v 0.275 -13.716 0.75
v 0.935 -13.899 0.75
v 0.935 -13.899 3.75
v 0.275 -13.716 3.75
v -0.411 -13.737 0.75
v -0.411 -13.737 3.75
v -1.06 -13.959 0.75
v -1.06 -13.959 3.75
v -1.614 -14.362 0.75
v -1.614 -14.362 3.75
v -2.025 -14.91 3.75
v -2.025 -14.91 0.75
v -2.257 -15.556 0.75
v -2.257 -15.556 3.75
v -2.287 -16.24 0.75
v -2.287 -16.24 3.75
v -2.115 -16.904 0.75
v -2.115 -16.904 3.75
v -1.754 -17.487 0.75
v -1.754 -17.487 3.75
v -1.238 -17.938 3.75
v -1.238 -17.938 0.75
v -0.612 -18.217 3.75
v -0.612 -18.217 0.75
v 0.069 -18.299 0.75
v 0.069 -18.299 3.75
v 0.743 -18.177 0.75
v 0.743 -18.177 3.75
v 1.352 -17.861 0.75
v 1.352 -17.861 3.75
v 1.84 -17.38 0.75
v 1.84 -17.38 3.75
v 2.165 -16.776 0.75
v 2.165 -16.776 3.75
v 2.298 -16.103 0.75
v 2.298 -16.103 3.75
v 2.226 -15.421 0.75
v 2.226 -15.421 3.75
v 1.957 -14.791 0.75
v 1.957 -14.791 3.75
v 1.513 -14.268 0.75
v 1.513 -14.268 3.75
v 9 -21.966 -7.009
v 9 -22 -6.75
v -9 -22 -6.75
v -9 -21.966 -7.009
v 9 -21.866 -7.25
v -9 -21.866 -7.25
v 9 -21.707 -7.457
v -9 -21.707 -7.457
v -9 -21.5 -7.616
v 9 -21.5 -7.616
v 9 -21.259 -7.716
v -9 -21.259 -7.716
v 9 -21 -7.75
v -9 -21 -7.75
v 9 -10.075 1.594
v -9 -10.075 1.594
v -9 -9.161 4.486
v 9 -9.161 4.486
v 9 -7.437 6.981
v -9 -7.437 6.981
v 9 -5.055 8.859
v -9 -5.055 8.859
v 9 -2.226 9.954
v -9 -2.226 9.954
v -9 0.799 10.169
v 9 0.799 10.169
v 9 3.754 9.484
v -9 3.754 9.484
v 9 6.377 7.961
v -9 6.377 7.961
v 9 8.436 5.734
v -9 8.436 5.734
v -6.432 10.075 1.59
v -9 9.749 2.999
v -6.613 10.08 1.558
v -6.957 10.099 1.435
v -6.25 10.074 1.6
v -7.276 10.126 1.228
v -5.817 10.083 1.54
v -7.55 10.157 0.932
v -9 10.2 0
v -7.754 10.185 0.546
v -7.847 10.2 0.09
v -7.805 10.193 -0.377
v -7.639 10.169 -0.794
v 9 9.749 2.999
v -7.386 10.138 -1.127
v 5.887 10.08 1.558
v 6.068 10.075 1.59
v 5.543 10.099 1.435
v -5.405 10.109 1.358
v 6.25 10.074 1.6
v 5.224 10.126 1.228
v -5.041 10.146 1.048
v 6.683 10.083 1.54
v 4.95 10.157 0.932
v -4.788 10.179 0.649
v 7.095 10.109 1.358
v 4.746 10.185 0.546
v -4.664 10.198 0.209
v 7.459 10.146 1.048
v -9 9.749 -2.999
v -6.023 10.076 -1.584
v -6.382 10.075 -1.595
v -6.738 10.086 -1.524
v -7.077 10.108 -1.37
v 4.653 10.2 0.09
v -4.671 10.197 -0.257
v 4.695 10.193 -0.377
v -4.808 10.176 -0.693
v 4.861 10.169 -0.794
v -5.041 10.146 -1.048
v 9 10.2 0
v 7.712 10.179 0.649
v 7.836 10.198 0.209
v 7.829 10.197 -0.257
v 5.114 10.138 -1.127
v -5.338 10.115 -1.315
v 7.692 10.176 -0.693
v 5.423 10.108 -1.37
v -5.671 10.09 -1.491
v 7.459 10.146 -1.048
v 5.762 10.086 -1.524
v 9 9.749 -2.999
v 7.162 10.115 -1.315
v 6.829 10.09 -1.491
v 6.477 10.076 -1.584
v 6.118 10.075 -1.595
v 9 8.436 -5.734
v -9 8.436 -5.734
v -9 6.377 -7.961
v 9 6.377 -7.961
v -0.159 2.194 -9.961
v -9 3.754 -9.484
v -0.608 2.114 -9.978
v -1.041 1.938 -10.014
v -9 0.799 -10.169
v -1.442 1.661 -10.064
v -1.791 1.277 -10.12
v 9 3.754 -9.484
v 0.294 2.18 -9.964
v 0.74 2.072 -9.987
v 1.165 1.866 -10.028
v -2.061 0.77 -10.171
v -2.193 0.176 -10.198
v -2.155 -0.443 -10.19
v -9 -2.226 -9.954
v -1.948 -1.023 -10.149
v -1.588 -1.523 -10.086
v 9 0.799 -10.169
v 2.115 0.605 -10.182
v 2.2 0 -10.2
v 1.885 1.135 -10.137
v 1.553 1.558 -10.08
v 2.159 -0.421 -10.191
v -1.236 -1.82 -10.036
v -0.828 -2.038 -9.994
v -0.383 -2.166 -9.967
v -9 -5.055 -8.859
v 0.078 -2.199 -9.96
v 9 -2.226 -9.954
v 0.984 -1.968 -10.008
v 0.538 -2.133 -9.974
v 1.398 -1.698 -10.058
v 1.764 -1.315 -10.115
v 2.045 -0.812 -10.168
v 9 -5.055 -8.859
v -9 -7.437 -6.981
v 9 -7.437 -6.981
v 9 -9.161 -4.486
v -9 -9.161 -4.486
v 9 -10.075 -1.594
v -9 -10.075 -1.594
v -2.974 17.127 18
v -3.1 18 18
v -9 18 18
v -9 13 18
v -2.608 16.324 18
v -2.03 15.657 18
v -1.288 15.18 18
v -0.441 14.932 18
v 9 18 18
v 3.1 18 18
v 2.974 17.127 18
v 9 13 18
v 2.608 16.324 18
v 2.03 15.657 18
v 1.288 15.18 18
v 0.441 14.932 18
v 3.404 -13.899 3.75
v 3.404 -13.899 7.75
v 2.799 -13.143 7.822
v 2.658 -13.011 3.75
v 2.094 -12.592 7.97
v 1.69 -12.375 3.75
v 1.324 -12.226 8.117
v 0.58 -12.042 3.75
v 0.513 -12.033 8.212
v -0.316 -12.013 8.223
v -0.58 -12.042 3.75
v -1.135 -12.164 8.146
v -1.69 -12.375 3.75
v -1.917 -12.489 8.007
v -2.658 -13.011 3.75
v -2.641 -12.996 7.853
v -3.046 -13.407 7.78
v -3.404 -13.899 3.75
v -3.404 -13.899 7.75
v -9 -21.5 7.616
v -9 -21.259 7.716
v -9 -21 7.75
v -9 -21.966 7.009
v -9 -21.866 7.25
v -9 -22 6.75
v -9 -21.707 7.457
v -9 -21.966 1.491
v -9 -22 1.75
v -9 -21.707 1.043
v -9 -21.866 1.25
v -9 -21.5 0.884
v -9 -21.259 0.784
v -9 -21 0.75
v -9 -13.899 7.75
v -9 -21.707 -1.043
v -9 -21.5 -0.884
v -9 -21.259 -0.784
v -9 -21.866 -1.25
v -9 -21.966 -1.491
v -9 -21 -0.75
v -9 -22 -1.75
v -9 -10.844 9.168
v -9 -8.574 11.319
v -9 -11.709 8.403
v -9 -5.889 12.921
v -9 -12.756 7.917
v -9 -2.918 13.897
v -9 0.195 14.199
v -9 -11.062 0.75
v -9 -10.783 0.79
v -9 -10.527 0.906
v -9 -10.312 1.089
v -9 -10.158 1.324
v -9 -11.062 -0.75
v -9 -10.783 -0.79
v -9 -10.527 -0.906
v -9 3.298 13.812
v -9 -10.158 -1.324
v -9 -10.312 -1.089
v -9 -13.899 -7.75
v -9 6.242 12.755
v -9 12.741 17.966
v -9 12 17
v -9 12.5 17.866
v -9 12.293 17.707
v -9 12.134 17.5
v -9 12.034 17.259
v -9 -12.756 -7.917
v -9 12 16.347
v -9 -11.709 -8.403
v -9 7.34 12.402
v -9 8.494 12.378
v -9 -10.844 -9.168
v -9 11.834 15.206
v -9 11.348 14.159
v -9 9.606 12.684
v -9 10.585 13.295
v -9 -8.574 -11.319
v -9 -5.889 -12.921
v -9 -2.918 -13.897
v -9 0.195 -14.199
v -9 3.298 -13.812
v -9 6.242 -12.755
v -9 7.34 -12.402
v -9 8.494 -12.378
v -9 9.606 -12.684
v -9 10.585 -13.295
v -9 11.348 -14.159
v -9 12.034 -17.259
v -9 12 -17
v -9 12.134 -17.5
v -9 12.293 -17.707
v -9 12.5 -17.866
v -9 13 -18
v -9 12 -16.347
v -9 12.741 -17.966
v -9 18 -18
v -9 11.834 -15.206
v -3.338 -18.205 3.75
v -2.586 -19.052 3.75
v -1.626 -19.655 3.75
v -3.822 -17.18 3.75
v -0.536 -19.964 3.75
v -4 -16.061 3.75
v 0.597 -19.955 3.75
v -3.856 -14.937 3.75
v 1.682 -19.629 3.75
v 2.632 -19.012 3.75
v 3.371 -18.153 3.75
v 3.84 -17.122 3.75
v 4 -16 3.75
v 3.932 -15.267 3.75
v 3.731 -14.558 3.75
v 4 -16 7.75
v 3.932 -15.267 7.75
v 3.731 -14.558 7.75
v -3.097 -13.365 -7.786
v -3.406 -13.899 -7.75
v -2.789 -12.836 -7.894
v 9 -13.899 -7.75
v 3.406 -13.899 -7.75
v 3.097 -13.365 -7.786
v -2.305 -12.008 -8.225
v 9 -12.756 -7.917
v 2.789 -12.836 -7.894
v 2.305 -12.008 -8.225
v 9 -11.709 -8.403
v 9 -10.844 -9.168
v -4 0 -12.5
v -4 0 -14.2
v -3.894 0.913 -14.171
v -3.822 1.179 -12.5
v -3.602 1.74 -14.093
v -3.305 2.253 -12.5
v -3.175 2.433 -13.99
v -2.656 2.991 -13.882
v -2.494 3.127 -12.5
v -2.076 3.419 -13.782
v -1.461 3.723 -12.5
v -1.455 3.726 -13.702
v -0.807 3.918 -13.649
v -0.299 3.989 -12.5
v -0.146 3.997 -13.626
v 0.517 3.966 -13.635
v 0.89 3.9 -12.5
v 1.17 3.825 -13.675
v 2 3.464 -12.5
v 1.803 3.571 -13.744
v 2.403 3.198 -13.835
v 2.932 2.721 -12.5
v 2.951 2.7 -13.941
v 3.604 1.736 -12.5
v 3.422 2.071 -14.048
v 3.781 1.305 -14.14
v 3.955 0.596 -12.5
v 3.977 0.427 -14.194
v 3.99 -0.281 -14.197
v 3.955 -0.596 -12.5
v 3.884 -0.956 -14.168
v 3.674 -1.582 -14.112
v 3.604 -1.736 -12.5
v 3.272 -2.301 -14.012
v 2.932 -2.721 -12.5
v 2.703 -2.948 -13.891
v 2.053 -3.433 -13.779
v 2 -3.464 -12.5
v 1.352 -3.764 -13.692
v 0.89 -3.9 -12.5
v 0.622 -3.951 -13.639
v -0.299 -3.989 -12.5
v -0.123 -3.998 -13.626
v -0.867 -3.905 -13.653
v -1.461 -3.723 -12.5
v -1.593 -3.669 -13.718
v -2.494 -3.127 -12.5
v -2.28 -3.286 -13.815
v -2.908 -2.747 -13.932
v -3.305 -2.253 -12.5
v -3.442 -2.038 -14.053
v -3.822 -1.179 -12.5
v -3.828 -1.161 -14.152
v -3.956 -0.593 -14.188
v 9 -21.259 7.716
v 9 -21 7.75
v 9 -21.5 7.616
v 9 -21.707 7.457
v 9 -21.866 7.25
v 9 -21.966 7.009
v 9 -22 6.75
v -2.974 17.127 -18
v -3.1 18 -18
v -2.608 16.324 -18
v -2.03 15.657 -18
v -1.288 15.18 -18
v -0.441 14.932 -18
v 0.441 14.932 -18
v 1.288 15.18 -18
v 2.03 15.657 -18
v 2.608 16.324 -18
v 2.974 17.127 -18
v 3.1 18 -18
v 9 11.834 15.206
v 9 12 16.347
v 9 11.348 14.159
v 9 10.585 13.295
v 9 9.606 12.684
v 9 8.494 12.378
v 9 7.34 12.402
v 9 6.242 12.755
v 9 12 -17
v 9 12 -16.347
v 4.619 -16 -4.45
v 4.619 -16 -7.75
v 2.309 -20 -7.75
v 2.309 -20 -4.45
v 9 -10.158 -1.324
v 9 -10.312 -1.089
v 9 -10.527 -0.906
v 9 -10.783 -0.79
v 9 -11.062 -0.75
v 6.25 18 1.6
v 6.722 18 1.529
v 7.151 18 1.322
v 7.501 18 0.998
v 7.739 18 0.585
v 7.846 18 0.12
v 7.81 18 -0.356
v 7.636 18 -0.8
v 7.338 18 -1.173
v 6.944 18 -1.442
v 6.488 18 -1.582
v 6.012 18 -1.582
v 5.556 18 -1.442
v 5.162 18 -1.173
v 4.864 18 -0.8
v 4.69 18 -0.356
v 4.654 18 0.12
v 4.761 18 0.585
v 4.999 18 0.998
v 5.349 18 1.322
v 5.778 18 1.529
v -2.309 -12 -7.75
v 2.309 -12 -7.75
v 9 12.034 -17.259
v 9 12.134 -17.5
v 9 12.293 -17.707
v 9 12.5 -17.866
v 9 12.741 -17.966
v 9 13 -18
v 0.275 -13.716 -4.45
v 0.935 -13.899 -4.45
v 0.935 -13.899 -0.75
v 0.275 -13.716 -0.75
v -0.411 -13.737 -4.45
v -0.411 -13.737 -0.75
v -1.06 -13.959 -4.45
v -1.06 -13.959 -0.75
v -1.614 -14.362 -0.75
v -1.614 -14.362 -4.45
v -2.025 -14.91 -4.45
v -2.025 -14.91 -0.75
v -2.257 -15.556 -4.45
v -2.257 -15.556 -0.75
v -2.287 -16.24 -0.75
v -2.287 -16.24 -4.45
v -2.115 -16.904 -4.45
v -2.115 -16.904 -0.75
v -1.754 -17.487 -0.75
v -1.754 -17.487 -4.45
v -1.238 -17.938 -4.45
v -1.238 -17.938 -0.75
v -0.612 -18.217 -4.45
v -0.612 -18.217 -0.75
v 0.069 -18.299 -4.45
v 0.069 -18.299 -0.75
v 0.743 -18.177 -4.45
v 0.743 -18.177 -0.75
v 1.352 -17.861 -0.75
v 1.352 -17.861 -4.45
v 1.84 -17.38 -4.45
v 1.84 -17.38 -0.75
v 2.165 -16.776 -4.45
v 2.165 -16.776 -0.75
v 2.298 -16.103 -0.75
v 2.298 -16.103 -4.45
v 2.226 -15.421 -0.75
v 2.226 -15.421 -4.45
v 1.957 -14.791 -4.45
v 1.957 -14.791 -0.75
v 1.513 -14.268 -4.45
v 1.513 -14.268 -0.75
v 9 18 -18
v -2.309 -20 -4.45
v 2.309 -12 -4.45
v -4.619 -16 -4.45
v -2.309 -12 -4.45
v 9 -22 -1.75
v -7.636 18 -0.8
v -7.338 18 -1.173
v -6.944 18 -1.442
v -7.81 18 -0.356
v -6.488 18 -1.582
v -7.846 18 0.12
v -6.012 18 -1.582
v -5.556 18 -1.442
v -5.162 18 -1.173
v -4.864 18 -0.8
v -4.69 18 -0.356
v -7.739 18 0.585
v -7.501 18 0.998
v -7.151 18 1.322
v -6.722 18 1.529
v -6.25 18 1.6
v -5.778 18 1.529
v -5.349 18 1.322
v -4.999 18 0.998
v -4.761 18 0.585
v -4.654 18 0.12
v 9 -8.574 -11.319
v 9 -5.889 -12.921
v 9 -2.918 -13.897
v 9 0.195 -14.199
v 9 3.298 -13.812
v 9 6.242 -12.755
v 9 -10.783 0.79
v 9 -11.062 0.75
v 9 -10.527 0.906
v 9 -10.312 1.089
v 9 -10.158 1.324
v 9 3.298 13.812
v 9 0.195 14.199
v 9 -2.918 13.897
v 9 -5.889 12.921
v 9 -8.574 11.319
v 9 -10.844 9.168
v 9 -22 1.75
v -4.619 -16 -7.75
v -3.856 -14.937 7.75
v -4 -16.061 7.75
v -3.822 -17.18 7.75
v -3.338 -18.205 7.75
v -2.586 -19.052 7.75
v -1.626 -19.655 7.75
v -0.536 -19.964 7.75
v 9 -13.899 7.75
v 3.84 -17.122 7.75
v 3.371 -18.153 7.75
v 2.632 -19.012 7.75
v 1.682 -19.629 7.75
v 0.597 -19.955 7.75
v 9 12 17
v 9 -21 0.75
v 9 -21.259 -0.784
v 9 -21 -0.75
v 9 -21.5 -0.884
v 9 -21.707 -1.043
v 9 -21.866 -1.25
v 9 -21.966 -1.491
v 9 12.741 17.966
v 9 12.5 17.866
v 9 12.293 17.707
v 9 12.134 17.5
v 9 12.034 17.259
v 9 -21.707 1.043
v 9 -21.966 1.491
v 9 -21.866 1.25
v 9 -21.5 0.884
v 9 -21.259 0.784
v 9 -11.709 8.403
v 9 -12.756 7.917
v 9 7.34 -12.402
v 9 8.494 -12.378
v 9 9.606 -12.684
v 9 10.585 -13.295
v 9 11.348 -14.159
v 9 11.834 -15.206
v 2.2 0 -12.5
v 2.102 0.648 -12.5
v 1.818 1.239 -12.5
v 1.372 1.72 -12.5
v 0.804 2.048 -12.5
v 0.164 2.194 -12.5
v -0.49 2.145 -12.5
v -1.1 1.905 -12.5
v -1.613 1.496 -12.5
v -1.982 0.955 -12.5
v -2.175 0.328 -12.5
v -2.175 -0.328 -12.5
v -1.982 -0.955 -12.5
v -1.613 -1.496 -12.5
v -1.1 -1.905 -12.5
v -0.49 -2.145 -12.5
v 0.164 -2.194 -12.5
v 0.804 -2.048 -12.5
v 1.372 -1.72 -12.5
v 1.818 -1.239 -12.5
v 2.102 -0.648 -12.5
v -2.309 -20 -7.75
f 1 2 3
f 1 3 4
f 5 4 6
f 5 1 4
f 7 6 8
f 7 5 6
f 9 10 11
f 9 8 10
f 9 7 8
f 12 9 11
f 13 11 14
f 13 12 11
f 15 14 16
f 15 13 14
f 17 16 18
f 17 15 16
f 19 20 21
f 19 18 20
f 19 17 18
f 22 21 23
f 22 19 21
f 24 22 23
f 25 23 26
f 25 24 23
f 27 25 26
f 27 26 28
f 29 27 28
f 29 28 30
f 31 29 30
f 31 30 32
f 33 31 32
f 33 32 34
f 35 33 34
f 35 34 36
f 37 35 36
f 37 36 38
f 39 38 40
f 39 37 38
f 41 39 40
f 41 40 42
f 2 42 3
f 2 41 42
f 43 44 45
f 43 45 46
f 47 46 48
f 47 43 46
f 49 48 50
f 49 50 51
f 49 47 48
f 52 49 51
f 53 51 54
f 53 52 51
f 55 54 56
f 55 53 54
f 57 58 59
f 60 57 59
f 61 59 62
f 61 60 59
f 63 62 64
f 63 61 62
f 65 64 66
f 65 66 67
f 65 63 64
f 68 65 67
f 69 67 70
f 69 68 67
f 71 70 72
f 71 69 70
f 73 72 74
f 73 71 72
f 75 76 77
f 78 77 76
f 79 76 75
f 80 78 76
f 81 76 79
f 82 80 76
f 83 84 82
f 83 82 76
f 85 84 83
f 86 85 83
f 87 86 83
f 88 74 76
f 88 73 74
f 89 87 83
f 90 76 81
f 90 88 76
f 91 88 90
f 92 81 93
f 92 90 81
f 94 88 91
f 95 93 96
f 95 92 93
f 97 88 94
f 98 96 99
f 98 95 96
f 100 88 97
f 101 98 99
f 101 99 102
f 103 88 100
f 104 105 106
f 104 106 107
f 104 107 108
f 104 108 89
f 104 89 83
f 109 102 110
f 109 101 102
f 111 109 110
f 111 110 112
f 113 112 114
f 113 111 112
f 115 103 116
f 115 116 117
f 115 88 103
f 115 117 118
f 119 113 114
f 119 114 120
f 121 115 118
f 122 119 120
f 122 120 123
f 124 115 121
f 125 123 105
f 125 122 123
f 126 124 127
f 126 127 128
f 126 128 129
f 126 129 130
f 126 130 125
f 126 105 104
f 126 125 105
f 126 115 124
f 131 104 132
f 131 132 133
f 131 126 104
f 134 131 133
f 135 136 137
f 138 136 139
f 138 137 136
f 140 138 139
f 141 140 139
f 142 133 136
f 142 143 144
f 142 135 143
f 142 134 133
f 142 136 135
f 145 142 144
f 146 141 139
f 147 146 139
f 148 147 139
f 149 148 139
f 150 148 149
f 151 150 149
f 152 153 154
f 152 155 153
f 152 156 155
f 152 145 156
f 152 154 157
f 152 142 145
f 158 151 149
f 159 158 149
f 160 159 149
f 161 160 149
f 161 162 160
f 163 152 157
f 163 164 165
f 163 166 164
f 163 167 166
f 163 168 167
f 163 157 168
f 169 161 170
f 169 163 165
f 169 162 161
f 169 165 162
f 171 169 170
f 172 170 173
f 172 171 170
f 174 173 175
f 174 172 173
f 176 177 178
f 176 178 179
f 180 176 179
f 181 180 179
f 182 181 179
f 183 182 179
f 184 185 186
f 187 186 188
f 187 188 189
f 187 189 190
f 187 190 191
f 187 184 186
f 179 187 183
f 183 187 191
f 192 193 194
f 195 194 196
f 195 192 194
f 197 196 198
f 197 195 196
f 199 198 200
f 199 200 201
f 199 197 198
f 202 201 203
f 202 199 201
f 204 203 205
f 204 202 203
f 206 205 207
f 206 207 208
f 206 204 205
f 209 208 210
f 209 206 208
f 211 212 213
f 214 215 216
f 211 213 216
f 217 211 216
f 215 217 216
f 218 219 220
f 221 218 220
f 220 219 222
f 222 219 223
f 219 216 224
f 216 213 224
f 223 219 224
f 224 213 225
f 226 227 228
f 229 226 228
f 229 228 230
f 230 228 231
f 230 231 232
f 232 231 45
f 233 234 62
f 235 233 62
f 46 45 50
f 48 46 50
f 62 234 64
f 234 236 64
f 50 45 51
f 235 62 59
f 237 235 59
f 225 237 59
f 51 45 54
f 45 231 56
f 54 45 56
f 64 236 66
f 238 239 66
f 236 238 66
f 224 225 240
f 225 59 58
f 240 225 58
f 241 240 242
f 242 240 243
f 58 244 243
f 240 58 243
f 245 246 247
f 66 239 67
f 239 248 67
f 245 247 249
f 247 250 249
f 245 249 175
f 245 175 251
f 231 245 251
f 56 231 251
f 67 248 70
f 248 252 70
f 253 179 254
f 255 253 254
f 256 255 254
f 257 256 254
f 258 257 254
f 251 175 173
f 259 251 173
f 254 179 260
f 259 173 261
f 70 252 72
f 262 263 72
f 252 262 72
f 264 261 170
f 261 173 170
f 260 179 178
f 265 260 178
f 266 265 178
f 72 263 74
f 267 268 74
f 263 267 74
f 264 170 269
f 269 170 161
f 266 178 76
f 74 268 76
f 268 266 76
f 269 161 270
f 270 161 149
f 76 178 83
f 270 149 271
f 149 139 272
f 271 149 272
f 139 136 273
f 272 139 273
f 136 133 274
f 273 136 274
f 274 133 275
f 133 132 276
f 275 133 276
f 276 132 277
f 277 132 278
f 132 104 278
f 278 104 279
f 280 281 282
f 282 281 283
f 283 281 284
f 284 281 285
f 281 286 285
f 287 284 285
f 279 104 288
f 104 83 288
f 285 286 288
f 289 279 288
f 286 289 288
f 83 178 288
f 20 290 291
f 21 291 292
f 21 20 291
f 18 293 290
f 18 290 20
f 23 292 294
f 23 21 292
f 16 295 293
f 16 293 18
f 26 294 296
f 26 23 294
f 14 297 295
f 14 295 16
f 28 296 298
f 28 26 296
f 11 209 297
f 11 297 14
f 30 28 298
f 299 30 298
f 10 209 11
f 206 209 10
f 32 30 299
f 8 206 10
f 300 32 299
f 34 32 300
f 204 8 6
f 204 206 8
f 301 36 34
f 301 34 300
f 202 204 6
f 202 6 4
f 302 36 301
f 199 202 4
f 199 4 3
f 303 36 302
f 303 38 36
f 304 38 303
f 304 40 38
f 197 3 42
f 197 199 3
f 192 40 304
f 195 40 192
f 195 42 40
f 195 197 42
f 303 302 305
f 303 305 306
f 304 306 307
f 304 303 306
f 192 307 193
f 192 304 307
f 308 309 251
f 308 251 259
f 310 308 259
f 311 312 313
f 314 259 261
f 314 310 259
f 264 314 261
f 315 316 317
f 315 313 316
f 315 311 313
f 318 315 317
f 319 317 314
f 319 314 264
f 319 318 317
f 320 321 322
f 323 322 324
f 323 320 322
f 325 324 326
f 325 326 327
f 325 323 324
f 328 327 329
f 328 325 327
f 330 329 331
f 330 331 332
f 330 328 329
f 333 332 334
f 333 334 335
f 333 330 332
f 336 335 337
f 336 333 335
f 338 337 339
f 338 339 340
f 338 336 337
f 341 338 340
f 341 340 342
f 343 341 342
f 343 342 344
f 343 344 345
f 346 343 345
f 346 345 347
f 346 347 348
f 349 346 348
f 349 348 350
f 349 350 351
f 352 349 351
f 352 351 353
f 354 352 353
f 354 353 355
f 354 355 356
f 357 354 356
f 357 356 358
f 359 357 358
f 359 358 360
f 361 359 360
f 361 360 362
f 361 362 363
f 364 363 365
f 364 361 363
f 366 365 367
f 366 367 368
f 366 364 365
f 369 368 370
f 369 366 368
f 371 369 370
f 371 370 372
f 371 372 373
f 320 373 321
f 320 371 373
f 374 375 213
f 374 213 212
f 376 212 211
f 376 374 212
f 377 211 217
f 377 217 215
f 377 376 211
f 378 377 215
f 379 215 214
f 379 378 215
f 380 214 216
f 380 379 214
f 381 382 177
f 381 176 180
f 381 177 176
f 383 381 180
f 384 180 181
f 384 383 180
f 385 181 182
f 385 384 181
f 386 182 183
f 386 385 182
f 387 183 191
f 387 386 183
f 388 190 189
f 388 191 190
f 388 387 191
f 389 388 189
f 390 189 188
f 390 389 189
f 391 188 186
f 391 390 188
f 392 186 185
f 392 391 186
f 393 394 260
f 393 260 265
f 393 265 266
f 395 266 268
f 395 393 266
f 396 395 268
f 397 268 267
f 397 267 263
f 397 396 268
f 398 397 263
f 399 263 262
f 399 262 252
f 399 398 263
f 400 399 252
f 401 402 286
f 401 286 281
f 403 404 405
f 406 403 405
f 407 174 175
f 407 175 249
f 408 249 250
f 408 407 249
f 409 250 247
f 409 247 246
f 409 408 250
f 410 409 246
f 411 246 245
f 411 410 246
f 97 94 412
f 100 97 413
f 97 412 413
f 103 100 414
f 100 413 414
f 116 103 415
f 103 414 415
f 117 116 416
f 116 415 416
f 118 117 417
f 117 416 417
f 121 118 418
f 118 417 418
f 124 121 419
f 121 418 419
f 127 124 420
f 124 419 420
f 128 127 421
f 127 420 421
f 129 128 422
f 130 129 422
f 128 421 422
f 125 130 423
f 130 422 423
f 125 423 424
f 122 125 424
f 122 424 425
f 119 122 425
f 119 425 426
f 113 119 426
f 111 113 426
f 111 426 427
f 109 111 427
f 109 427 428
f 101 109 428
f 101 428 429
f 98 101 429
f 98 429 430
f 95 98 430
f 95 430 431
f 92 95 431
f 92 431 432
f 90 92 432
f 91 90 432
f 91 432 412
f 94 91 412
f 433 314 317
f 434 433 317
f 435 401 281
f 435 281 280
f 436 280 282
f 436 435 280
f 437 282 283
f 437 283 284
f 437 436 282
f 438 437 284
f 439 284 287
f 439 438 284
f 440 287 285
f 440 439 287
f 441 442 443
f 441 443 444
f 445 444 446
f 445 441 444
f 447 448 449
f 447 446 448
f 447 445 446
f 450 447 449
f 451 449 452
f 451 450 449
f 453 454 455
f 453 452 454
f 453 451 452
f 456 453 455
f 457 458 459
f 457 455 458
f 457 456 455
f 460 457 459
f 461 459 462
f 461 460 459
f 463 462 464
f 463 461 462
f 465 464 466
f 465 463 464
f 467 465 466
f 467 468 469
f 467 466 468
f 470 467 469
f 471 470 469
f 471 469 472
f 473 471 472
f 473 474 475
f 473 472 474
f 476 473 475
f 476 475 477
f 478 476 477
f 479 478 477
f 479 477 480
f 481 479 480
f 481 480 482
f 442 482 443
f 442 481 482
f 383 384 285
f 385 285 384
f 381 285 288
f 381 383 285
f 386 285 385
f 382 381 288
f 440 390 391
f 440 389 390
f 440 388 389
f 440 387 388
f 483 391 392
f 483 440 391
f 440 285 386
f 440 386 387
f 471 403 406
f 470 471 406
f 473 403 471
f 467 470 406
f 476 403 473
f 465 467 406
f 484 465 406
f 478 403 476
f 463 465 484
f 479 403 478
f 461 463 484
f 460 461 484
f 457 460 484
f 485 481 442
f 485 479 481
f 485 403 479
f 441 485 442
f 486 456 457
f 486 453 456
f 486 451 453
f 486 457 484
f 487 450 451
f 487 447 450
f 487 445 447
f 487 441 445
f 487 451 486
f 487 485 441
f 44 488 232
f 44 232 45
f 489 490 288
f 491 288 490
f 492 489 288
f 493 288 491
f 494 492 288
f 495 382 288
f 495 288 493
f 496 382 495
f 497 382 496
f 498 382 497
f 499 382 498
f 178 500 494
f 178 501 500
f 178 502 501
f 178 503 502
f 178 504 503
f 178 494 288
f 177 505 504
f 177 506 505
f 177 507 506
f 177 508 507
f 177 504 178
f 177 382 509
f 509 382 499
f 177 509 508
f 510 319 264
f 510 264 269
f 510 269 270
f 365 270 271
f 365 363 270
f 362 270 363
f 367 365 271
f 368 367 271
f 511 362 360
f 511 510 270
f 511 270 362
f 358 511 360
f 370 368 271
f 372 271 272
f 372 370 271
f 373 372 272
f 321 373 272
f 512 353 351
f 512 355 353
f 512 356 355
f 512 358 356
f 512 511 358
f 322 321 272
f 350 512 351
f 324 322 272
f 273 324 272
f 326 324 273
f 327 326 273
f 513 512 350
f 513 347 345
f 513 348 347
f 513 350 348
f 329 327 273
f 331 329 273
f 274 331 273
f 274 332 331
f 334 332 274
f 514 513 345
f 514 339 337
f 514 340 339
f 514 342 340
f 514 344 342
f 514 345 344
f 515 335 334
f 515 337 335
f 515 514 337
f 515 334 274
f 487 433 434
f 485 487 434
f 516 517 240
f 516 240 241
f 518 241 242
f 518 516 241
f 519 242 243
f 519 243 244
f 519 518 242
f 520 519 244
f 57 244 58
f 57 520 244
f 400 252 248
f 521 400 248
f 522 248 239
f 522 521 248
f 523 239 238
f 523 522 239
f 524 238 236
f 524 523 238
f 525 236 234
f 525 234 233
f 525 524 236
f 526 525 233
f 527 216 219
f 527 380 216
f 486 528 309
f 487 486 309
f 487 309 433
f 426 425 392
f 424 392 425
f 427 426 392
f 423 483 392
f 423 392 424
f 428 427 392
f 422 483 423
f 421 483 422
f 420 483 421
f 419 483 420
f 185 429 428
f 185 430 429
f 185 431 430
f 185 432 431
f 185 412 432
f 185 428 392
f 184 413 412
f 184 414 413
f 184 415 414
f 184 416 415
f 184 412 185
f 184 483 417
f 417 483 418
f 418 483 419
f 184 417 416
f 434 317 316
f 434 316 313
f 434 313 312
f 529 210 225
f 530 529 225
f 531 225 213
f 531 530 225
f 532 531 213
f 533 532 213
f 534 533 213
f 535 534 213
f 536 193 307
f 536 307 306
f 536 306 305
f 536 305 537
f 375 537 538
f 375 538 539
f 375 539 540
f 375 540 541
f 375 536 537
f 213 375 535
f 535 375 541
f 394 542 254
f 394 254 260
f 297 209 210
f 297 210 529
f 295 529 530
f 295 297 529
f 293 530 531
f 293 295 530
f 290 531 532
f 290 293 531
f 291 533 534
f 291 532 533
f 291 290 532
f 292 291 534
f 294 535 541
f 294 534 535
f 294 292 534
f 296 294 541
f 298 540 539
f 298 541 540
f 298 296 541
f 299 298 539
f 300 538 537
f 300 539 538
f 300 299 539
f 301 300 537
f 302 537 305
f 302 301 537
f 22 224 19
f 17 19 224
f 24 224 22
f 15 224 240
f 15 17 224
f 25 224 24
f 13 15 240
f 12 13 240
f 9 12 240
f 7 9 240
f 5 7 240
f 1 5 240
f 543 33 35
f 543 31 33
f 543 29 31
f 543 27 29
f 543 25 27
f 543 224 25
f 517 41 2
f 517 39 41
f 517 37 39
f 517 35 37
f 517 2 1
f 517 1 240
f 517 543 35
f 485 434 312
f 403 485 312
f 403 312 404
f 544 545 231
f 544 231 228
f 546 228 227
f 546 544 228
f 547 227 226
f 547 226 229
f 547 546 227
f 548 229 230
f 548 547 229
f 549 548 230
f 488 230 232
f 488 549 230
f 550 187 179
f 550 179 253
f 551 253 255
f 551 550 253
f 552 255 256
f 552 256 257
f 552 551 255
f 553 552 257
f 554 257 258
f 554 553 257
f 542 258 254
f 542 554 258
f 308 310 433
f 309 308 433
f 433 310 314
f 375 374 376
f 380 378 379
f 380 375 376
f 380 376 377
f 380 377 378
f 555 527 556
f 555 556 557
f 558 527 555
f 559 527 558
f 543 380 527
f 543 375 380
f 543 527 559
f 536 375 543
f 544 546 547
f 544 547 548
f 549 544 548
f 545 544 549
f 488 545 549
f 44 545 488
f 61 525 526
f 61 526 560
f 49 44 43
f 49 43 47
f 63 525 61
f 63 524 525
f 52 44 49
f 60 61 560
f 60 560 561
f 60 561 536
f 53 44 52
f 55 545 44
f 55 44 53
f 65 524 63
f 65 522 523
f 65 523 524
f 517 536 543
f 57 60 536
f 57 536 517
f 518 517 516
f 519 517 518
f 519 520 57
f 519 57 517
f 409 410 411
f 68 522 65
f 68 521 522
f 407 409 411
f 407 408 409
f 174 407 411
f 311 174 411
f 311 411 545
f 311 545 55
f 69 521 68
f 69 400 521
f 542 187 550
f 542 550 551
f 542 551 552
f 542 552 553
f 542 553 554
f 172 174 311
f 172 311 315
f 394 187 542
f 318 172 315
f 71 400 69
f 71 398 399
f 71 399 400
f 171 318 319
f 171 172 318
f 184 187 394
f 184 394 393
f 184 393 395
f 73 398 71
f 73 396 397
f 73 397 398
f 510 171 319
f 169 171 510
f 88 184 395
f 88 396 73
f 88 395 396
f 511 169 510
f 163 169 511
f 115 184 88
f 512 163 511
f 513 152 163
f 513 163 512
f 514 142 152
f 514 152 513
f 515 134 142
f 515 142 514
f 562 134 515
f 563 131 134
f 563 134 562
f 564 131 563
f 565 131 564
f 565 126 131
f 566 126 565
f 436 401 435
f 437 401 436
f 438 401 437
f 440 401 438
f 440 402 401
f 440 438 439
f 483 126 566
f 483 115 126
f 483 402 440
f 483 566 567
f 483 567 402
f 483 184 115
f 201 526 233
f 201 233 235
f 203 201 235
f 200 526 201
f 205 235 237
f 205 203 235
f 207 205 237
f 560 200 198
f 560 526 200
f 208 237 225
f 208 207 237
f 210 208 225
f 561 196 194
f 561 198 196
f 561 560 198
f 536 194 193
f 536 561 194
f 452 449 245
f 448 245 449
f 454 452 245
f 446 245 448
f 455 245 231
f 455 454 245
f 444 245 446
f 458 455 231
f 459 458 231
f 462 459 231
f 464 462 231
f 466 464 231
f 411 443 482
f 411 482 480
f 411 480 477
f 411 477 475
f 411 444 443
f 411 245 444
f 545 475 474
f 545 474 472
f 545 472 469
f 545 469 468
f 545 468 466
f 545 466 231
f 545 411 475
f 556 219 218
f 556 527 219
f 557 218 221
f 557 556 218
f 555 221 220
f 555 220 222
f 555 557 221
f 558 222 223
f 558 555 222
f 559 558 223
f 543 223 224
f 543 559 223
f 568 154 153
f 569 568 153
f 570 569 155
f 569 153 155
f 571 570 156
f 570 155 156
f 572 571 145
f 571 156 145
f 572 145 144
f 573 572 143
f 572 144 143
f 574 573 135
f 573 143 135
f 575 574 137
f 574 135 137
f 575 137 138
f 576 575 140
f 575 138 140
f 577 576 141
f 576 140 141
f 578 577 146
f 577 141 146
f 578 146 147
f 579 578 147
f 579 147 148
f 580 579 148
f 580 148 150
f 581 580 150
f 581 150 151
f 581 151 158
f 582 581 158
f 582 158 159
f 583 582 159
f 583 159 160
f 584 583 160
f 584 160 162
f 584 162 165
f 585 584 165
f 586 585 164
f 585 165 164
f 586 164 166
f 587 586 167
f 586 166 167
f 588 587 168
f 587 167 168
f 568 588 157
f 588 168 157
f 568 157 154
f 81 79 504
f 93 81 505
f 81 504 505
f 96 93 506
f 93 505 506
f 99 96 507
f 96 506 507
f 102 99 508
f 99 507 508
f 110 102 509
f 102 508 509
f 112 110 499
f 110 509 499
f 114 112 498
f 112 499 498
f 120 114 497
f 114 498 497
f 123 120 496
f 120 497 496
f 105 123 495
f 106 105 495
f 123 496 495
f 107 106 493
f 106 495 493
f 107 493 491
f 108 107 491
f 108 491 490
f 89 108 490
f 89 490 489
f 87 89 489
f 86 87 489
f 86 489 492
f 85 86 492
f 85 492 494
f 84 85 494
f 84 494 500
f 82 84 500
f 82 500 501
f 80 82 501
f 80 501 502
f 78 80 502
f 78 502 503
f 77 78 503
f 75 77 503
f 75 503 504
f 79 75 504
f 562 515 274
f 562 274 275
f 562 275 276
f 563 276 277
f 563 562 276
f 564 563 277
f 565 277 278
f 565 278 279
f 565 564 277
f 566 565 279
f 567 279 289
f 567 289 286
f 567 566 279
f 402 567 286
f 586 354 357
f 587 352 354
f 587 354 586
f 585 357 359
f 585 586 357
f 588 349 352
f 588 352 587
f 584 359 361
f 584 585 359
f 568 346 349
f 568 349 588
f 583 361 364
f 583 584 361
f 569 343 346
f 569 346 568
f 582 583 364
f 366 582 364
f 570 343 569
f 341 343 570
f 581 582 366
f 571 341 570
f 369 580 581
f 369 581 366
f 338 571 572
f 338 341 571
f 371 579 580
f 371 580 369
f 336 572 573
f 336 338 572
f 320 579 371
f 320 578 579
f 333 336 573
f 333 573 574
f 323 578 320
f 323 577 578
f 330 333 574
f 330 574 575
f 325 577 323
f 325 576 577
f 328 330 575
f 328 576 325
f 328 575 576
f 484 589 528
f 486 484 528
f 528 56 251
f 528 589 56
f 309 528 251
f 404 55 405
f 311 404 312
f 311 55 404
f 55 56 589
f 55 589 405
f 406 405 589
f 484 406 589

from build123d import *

# Parameters (mm, degrees)
EXTRUDE_1_DEPTH               = 9
CUT_EXTRUDE_1_DEPTH           = 30.816103032
CUT_EXTRUDE_1_DEPTH_BACK      = 30.816103032
SKETCH_2_R                    = 2.3
CUT_EXTRUDE_2_DEPTH           = 3.3
CUT_EXTRUDE_2_OTHER_WAY_DEPTH = 36.043722716
CUT_EXTRUDE_2_OTHER_WAY_TAPER = 1
CUT_EXTRUDE_3_DEPTH           = 36.043722716
CUT_EXTRUDE_3_DEPTH_BACK      = 4
CUT_EXTRUDE_4_REACH           = 46.777
CUT_EXTRUDE_4_END_RADIUS      = 10.2
SKETCH_5_R                    = 1.6
SKETCH_6_R                    = 2.2
CUT_EXTRUDE_5_DEPTH           = 30.816103062
CUT_EXTRUDE_START             = -5.5
SKETCH_7_R                    = 4
SKETCH_7_R_2                  = 2.2
CUT_EXTRUDE_6_DEPTH           = 5.5


with BuildPart() as part:
    # Эскиз1 → Бобышка-Вытянуть1 (new, symmetric)
    with BuildSketch(Plane(origin=(0, 0, 0), x_dir=(0, 0, -1), z_dir=(1, 0, 0))):
        with BuildLine():
            Line((-0.75, -21), (-0.75, -11.06243644))
            ThreePointArc((-0.75, -11.06243644), (-0.989654684, -10.412917388), (-1.59375, -10.074718901))
            ThreePointArc((-1.59375, -10.074718901), (0, 10.2), (1.59375, -10.074718901))
            ThreePointArc((1.59375, -10.074718901), (0.989654684, -10.412917388), (0.75, -11.06243644))
            Line((0.75, -11.06243644), (0.75, -21))
            ThreePointArc((0.75, -21), (1.042893219, -21.707106781), (1.75, -22))
            Line((1.75, -22), (6.75, -22))
            ThreePointArc((6.75, -22), (7.457106781, -21.707106781), (7.75, -21))
            Line((7.75, -21), (7.75, -13.898830886))
            ThreePointArc((7.75, -13.898830886), (8.121662204, -12.215036114), (9.167582418, -10.844142779))
            ThreePointArc((9.167582418, -10.844142779), (13.897042702, -2.917568189), (12.75462481, 6.241758242))
            ThreePointArc((12.75462481, 6.241758242), (12.953882386, 10.117431577), (16.34747687, 12))
            Line((16.34747687, 12), (17, 12))
            ThreePointArc((17, 12), (17.707106781, 12.292893219), (18, 13))
            Line((18, 13), (18, 18))
            Line((18, 18), (-18, 18))
            Line((-18, 18), (-18, 13))
            ThreePointArc((-18, 13), (-17.707106781, 12.292893219), (-17, 12))
            Line((-17, 12), (-16.34747687, 12))
            ThreePointArc((-16.34747687, 12), (-12.953882386, 10.117431577), (-12.75462481, 6.241758242))
            ThreePointArc((-12.75462481, 6.241758242), (-13.897042702, -2.917568189), (-9.167582418, -10.844142779))
            ThreePointArc((-9.167582418, -10.844142779), (-8.121662204, -12.215036114), (-7.75, -13.898830886))
            Line((-7.75, -13.898830886), (-7.75, -21))
            ThreePointArc((-7.75, -21), (-7.457106781, -21.707106781), (-6.75, -22))
            Line((-6.75, -22), (-1.75, -22))
            ThreePointArc((-1.75, -22), (-1.042893219, -21.707106781), (-0.75, -21))
        make_face()
    extrude(amount=EXTRUDE_1_DEPTH, both=True)

    # Эскиз2 → Вырез-Вытянуть1 (cut, two sides: drawn at the far end of the back side and taken through both)
    with BuildSketch(Plane.XY.offset(-CUT_EXTRUDE_1_DEPTH_BACK)):
        with BuildLine():
            ThreePointArc((-3.1, 18), (0, 14.9), (3.1, 18))
            Line((3.1, 18), (-3.1, 18))
        make_face()
        with Locations(Location((0, -16, 0), (0, 0, 66.000891847))):
            Circle(SKETCH_2_R)
    extrude(amount=CUT_EXTRUDE_1_DEPTH + CUT_EXTRUDE_1_DEPTH_BACK, mode=Mode.SUBTRACT)

    # Эскиз3 → Вырез-Вытянуть2 (cut)
    with BuildSketch(Plane(origin=(0, 0, -7.75), x_dir=(-1, 0, 0), z_dir=(0, 0, -1))):
        Polygon((-4.618802154, -16), (-2.309401077, -20), (2.309401077, -20), (4.618802154, -16), (2.309401077, -12), (-2.309401077, -12), align=None)
    extrude(amount=-CUT_EXTRUDE_2_DEPTH, mode=Mode.SUBTRACT)

    # Эскиз3 → Вырез-Вытянуть2 other way (cut)
    with BuildSketch(Plane(origin=(0, 0, -7.75), x_dir=(-1, 0, 0), z_dir=(0, 0, -1))):
        Polygon((-4.618802154, -16), (-2.309401077, -20), (2.309401077, -20), (4.618802154, -16), (2.309401077, -12), (-2.309401077, -12), align=None)
    extrude(amount=CUT_EXTRUDE_2_OTHER_WAY_DEPTH, taper=CUT_EXTRUDE_2_OTHER_WAY_TAPER, mode=Mode.SUBTRACT)

    # Эскиз4 → Вырез-Вытянуть3 (cut, two sides: drawn at the far end of the back side and taken through both)
    with BuildSketch(Plane.XY.offset(7.75).offset(-CUT_EXTRUDE_3_DEPTH_BACK)):
        with BuildLine():
            Line((-3.403687464, -13.898830886), (-0.935461573, -13.898830886))
            ThreePointArc((-0.935461573, -13.898830886), (0, -18.3), (0.935461573, -13.898830886))
            Line((0.935461573, -13.898830886), (3.403687464, -13.898830886))
            ThreePointArc((3.403687464, -13.898830886), (0, -12), (-3.403687464, -13.898830886))
        make_face()
        with BuildLine():
            ThreePointArc((0.935461573, -13.898830886), (0, -18.3), (-0.935461573, -13.898830886))
            Line((-0.935461573, -13.898830886), (-3.403687464, -13.898830886))
            ThreePointArc((-3.403687464, -13.898830886), (-1.092073748, -19.848035204), (4, -16))
            ThreePointArc((4, -16), (3.848035204, -14.907926252), (3.403687464, -13.898830886))
            Line((3.403687464, -13.898830886), (0.935461573, -13.898830886))
        make_face()
        with BuildLine():
            Line((-3.403687464, -13.898830886), (-0.935461573, -13.898830886))
            ThreePointArc((-0.935461573, -13.898830886), (0, -18.3), (0.935461573, -13.898830886))
            Line((0.935461573, -13.898830886), (3.403687464, -13.898830886))
            ThreePointArc((3.403687464, -13.898830886), (0, -12), (-3.403687464, -13.898830886))
        make_face()
        with BuildLine():
            ThreePointArc((0.935461573, -13.898830886), (0, -18.3), (-0.935461573, -13.898830886))
            Line((-0.935461573, -13.898830886), (-3.403687464, -13.898830886))
            ThreePointArc((-3.403687464, -13.898830886), (-1.092073748, -19.848035204), (4, -16))
            ThreePointArc((4, -16), (3.848035204, -14.907926252), (3.403687464, -13.898830886))
            Line((3.403687464, -13.898830886), (0.935461573, -13.898830886))
        make_face()
    extrude(amount=CUT_EXTRUDE_3_DEPTH + CUT_EXTRUDE_3_DEPTH_BACK, mode=Mode.SUBTRACT)

    # Вырез-Вытянуть4: up to this cylinder (the profile starts outside it)
    cut_extrude_4_end = Plane(origin=(0, 0, 0), z_dir=(-1, 0, 0)) * Cylinder(CUT_EXTRUDE_4_END_RADIUS, 127.454, mode=Mode.PRIVATE)
    # Эскиз5 → Вырез-Вытянуть4 (cut, up to the surface)
    with BuildSketch(Plane(origin=(0, 18, 0), x_dir=(1, 0, 0), z_dir=(0, 1, 0)), mode=Mode.PRIVATE) as cut_extrude_4_sk1:
        with Locations(Location((6.25, 0, 0), (0, 0, 270))):
            Circle(SKETCH_5_R)
    cut_extrude_4_tool1 = extrude(cut_extrude_4_sk1.sketch, amount=-CUT_EXTRUDE_4_REACH, mode=Mode.PRIVATE) - cut_extrude_4_end
    add(cut_extrude_4_tool1.solids().sort_by_distance((6.25, 18, 0))[0], mode=Mode.SUBTRACT)
    # Эскиз5 → Вырез-Вытянуть4 (cut, up to the surface)
    with BuildSketch(Plane(origin=(0, 18, 0), x_dir=(1, 0, 0), z_dir=(0, 1, 0)), mode=Mode.PRIVATE) as cut_extrude_4_sk2:
        with Locations(Location((-6.25, 0, 0), (0, 0, 270))):
            Circle(SKETCH_5_R)
    cut_extrude_4_tool2 = extrude(cut_extrude_4_sk2.sketch, amount=-CUT_EXTRUDE_4_REACH, mode=Mode.PRIVATE) - cut_extrude_4_end
    add(cut_extrude_4_tool2.solids().sort_by_distance((-6.25, 18, 0))[0], mode=Mode.SUBTRACT)

    # Эскиз6 → Вырез-Вытянуть5 (cut, through all)
    with BuildSketch(Plane.XY):
        Circle(SKETCH_6_R)
    extrude(amount=-CUT_EXTRUDE_5_DEPTH, mode=Mode.SUBTRACT)

    # Эскиз7 → Вырез-Вытянуть6 (cut)
    with BuildSketch(Plane(origin=(0, 0, -18), x_dir=(-1, 0, 0), z_dir=(0, 0, -1)).offset(CUT_EXTRUDE_START)):
        Circle(SKETCH_7_R)
        with Locations(Location((0, 0, 0), (0, 0, 180))):
            Circle(SKETCH_7_R_2, mode=Mode.SUBTRACT)
    extrude(amount=CUT_EXTRUDE_6_DEPTH, mode=Mode.SUBTRACT)


solid = part.part
